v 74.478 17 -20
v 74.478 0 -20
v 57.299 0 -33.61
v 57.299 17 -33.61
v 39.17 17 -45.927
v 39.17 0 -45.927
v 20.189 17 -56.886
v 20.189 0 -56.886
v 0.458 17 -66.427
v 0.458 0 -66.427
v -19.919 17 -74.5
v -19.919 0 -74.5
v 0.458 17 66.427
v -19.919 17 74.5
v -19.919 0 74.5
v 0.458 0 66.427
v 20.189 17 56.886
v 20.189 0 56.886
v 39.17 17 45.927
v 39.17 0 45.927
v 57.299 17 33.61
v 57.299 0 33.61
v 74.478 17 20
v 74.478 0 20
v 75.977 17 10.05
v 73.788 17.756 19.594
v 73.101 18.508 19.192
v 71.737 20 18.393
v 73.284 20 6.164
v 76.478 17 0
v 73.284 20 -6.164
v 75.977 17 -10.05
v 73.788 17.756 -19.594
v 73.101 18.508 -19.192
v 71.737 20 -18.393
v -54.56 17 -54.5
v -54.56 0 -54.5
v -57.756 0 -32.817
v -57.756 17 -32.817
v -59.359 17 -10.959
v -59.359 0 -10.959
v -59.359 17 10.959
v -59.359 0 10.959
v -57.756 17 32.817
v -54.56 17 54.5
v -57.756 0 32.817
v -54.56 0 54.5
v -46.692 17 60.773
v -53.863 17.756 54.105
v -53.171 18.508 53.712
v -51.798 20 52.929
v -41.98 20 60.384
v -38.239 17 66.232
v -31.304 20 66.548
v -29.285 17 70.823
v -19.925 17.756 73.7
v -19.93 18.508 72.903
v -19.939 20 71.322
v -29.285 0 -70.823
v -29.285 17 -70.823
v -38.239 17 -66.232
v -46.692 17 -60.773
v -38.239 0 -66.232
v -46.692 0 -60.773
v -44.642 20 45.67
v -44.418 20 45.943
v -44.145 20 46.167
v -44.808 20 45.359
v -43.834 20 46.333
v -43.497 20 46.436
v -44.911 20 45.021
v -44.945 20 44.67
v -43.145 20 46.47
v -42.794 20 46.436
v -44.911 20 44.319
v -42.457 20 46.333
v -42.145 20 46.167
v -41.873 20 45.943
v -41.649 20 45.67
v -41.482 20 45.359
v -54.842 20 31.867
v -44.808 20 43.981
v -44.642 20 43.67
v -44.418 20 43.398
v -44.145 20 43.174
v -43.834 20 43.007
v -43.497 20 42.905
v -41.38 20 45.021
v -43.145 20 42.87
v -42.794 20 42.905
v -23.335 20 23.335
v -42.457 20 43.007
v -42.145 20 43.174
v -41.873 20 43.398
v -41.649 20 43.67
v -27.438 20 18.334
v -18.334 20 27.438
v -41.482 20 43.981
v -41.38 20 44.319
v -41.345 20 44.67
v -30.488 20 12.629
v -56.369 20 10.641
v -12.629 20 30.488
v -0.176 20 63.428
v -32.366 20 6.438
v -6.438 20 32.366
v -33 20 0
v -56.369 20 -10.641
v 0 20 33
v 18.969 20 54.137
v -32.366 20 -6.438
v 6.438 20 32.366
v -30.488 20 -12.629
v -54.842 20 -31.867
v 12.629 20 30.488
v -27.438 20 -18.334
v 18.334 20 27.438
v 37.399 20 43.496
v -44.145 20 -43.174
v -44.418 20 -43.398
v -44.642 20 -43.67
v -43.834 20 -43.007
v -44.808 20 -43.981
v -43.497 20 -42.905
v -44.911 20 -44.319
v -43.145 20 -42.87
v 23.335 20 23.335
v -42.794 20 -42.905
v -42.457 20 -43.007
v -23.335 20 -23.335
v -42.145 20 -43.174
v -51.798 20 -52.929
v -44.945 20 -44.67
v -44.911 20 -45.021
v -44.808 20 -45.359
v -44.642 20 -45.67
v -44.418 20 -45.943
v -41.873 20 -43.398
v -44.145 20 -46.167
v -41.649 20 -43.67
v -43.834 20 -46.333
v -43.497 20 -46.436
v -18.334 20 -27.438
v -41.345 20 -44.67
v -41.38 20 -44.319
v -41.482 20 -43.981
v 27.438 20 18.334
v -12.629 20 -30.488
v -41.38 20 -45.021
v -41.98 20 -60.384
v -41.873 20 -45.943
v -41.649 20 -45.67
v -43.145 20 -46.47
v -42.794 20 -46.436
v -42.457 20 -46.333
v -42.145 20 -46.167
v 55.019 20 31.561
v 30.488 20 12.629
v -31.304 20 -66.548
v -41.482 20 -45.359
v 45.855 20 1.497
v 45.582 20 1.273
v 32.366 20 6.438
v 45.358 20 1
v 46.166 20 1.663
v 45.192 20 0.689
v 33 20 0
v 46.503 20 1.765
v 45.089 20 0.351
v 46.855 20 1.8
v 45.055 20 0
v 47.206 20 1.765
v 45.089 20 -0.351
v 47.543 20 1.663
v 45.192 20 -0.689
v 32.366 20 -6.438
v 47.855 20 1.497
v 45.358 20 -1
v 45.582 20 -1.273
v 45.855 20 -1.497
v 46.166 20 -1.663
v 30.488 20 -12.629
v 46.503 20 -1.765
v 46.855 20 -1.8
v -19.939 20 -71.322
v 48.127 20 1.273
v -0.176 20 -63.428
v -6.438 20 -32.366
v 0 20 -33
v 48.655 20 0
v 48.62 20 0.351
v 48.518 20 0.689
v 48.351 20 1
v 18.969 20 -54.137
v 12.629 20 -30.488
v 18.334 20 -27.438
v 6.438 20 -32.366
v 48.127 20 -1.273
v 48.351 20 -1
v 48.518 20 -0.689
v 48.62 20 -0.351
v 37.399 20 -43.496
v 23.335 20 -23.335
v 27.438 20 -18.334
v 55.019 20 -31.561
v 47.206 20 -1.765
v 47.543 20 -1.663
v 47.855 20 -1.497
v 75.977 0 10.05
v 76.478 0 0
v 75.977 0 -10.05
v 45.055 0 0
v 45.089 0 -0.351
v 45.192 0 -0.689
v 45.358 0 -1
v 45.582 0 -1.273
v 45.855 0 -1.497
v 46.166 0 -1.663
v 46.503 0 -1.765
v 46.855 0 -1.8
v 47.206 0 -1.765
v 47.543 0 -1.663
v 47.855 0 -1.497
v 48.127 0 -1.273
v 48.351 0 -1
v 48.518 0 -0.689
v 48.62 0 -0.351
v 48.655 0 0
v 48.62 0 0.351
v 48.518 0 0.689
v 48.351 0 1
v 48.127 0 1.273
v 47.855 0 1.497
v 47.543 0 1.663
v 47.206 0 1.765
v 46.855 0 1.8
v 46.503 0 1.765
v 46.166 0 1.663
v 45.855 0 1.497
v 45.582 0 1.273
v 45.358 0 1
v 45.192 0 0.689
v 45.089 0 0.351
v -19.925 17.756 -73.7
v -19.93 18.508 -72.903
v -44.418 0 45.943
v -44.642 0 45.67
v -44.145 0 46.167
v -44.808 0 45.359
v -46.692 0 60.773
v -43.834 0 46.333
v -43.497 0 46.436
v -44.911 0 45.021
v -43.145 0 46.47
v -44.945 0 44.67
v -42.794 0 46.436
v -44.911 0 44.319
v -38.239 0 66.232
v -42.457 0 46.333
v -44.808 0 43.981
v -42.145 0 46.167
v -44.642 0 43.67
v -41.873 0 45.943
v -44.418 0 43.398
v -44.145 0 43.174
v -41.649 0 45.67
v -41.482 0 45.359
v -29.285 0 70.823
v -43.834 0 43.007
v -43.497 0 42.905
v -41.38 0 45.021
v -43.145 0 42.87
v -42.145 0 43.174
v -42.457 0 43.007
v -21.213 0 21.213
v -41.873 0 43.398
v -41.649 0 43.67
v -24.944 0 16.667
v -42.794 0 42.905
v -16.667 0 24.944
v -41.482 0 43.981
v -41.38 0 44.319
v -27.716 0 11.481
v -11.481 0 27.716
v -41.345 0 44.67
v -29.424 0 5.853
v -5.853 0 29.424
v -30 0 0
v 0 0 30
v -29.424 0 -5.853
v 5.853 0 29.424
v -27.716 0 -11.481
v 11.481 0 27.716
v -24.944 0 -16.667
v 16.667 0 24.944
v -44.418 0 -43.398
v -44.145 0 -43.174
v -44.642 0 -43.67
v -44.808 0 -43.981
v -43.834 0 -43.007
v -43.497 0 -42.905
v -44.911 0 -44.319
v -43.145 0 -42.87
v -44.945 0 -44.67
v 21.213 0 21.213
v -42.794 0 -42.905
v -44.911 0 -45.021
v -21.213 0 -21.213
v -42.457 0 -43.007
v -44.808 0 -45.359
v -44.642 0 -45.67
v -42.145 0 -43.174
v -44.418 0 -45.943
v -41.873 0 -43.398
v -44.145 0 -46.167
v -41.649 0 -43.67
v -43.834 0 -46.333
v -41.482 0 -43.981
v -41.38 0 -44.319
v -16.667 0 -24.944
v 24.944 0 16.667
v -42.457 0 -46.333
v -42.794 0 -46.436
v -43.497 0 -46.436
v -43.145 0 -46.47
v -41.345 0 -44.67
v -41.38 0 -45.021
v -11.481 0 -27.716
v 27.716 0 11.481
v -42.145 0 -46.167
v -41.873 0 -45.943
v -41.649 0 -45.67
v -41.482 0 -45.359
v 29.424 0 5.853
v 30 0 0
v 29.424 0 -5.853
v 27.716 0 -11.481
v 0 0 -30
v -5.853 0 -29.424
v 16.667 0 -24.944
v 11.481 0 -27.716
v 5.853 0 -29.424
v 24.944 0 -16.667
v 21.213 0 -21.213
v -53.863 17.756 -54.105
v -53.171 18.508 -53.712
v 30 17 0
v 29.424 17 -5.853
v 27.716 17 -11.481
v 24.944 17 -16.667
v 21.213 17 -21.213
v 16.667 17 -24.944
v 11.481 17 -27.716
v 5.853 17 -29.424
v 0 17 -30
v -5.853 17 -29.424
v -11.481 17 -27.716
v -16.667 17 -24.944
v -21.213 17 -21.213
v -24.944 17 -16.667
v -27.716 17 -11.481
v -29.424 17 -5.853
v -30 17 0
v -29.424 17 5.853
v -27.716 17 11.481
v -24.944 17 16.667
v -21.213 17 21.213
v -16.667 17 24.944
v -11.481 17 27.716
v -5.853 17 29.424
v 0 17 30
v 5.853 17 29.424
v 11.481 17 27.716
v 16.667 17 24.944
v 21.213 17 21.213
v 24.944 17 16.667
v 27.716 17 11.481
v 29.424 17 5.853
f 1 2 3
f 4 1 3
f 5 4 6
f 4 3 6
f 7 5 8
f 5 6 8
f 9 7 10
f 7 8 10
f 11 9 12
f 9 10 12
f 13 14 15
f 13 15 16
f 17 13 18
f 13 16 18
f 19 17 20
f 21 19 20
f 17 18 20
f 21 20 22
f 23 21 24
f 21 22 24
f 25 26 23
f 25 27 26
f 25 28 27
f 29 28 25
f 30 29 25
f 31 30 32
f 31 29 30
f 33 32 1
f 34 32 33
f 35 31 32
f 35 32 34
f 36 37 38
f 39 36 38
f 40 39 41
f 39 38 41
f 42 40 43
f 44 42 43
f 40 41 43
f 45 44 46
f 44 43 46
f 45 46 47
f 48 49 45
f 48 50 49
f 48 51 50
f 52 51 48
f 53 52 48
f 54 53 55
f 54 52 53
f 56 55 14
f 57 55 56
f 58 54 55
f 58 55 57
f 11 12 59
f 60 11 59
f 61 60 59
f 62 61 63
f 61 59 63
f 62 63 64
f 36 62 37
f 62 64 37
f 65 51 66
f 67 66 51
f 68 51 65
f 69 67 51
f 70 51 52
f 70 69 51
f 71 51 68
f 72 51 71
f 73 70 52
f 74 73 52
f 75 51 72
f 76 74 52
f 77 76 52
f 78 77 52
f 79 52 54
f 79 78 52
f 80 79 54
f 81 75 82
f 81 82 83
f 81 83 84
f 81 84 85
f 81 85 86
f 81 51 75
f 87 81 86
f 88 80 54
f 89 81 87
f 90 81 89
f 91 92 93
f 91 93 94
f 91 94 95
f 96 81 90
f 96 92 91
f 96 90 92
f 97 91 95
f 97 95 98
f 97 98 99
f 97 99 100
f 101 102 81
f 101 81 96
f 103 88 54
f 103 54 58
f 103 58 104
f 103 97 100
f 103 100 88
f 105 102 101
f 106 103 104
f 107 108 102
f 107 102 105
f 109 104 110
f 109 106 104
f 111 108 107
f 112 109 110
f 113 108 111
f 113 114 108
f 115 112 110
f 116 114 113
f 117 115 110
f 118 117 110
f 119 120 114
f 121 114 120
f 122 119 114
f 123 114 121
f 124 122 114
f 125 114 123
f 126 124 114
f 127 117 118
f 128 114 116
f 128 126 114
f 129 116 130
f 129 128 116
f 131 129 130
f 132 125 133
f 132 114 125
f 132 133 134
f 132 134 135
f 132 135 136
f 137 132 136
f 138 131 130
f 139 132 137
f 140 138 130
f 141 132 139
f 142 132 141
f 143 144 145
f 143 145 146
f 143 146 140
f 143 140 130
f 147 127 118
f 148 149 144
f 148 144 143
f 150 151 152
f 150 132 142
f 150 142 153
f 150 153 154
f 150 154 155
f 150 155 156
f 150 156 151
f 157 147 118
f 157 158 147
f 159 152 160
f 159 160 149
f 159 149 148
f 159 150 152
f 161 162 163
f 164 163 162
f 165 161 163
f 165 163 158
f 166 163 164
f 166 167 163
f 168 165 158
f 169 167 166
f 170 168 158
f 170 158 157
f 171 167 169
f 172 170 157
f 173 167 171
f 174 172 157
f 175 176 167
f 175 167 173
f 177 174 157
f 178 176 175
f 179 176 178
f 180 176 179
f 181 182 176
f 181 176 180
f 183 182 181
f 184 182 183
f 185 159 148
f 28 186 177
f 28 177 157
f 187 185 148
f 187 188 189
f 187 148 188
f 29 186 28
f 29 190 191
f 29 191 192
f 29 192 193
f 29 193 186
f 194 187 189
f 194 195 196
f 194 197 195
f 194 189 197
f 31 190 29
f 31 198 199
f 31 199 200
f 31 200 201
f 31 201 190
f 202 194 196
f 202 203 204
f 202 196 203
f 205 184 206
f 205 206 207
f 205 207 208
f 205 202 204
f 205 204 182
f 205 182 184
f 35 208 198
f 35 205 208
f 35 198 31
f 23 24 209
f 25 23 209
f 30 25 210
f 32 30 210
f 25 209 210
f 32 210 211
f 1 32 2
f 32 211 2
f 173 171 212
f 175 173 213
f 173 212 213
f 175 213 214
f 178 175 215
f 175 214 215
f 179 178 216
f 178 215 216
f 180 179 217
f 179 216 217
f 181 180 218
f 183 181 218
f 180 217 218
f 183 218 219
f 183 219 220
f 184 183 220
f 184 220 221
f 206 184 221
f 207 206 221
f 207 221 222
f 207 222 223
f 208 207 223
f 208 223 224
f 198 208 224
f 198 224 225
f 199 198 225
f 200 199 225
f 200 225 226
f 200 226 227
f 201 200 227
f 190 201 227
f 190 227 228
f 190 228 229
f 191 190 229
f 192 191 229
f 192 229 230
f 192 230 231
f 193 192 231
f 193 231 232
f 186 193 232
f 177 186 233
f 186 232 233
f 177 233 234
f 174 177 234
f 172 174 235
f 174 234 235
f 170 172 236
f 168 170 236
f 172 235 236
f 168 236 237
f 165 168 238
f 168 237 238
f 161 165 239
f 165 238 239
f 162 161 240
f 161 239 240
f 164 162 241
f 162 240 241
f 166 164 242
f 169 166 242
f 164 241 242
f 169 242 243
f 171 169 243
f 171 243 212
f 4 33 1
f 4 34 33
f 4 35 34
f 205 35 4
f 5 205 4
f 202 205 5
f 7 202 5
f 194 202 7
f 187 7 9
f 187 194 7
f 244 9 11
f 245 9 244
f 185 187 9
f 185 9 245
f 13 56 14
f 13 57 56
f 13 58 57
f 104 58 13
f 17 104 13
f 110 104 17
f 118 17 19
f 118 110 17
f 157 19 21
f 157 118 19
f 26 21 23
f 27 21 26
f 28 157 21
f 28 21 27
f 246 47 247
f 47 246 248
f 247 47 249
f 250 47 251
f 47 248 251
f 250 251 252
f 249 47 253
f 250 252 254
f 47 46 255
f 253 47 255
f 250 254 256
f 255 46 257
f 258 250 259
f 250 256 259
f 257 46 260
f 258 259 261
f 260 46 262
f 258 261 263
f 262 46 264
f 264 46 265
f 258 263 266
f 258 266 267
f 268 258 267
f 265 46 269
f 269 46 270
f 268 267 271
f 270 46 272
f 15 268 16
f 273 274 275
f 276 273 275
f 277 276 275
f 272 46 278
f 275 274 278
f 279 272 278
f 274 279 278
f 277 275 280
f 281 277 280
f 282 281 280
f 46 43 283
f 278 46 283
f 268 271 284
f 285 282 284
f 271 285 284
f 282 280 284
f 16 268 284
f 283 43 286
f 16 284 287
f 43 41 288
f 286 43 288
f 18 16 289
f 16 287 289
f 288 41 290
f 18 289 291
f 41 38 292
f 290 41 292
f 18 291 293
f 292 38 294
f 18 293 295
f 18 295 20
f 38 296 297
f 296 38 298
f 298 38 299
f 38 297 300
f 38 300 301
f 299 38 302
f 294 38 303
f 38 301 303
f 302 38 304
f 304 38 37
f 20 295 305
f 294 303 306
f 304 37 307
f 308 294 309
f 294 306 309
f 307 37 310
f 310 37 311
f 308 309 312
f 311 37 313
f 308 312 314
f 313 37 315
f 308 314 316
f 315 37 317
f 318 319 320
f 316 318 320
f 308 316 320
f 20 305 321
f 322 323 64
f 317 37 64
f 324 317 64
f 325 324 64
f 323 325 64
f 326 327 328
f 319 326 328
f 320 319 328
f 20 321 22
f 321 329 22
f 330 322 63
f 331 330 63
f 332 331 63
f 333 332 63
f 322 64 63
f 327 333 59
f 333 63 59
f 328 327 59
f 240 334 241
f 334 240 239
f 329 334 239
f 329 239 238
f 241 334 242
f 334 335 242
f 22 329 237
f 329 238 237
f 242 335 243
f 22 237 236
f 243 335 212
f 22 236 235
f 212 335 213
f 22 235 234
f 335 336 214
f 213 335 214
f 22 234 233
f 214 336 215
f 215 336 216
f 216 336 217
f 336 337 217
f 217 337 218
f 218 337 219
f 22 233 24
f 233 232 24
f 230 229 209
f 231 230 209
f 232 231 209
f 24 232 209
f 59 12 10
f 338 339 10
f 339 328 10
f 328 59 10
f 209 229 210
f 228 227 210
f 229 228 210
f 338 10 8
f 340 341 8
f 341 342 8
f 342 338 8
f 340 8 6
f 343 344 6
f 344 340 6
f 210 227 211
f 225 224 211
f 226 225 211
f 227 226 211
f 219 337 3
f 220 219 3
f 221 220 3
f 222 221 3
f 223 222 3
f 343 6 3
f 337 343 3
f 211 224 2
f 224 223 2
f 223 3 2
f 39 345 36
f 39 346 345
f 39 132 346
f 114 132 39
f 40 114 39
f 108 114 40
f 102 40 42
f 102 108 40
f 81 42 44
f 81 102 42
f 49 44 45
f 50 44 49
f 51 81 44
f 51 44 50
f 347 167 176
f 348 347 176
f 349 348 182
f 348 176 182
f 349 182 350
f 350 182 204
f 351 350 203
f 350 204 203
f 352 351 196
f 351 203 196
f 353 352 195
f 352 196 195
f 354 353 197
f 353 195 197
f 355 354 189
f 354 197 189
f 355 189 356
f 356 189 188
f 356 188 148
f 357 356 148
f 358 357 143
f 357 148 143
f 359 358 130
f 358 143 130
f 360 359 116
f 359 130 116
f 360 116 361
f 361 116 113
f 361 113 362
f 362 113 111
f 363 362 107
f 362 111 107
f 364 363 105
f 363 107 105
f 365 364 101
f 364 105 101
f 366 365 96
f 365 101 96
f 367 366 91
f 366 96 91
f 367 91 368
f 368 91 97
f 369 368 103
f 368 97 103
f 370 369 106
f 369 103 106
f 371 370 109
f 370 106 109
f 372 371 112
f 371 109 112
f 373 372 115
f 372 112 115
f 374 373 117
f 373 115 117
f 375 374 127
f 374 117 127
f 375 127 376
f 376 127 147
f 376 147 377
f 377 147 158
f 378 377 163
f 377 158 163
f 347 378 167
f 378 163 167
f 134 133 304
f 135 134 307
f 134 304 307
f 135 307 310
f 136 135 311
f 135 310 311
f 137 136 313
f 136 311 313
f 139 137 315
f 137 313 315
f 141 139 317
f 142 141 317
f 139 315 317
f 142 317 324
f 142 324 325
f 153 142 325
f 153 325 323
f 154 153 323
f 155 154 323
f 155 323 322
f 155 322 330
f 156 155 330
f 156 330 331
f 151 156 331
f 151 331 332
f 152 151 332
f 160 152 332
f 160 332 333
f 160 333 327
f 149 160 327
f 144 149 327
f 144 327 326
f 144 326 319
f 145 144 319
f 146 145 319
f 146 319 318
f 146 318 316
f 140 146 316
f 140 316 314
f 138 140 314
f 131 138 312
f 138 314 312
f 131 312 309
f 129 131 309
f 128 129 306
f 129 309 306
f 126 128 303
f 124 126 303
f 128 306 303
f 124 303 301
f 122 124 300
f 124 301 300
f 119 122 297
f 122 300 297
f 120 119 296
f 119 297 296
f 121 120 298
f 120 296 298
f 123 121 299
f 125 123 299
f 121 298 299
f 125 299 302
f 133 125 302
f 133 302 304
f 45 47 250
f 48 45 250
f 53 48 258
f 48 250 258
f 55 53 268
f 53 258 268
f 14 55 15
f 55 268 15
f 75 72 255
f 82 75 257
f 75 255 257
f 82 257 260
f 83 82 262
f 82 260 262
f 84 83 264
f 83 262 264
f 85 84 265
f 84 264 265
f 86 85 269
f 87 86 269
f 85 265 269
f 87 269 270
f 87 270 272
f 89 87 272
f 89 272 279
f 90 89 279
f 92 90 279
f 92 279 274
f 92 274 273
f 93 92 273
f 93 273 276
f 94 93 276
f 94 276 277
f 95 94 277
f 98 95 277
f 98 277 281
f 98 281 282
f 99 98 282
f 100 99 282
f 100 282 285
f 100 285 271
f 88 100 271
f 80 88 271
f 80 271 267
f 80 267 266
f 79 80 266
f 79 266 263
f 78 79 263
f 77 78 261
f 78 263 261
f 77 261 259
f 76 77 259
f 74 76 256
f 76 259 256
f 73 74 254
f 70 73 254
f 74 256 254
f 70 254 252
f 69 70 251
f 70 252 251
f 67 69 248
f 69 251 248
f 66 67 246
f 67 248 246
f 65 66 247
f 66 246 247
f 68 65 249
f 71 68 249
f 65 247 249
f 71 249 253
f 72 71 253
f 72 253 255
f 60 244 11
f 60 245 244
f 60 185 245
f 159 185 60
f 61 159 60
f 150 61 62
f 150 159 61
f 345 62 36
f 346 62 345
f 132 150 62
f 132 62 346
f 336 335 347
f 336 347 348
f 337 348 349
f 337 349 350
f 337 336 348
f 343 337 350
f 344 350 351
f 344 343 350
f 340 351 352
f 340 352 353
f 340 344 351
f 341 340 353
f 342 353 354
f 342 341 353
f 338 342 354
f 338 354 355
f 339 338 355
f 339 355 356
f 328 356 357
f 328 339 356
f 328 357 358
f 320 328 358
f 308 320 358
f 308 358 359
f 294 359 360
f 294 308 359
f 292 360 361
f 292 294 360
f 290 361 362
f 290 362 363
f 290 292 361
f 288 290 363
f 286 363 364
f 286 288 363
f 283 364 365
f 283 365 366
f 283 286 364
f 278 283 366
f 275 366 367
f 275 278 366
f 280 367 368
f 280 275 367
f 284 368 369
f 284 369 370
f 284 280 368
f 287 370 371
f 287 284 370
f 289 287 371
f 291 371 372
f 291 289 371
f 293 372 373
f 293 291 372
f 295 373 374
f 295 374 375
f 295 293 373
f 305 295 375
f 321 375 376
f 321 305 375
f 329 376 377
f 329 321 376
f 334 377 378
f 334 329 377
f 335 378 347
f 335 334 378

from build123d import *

# Parameters (mm, degrees)
SKETCH1_R            = 30
BOSS_EXTRUDE1_DEPTH  = 20
CHAMFER1_SIZE        = 3
M3_CLEARANCE_HOLE1_D = 3.6


with BuildPart() as part:
    # Sketch1 → Boss-Extrude1 (new body)
    with BuildSketch(Plane(origin=(0, 0, 0), x_dir=(1, 0, 0), z_dir=(0, 1, 0))):
        with BuildLine():
            ThreePointArc((-54.559600438, 54.5), (-59.559600438, 0), (-54.559600438, -54.5))
            ThreePointArc((-54.559600438, -54.5), (-38.239092363, -66.232050808), (-19.918584287, -74.5))
            ThreePointArc((-19.918584287, -74.5), (29.779800219, -51.580127019), (74.478184725, -20))
            ThreePointArc((74.478184725, -20), (76.478184725, 0), (74.478184725, 20))
            ThreePointArc((74.478184725, 20), (29.779800219, 51.580127019), (-19.918584287, 74.5))
            ThreePointArc((-19.918584287, 74.5), (-38.239092363, 66.232050808), (-54.559600438, 54.5))
        make_face()
        Circle(SKETCH1_R, mode=Mode.SUBTRACT)
    extrude(amount=BOSS_EXTRUDE1_DEPTH)

    # Chamfer1
    chamfer1_edges = [part.edges().sort_by_distance(p)[0] for p in [
        (-38.239092363, 20, 66.232050808),
        (29.779800219, 20, 51.580127019),
        (-30, 20, 0),
        (76.478184725, 20, 0),
        (29.779800219, 20, -51.580127019),
        (-38.239092363, 20, -66.232050808),
        (-59.559600438, 20, 0),
    ]]
    chamfer(chamfer1_edges, length=CHAMFER1_SIZE)

    # M3 Clearance Hole1 (through all)
    with Locations(Plane(origin=(0, 20, 0), x_dir=(1, 0, 0), z_dir=(0, 1, 0))):
        with Locations((0, 0), (-43.145434031, 44.670326137), (-43.145434031, -44.670326137), (46.854565969, 0)):
            Hole(M3_CLEARANCE_HOLE1_D / 2)


solid = part.part
